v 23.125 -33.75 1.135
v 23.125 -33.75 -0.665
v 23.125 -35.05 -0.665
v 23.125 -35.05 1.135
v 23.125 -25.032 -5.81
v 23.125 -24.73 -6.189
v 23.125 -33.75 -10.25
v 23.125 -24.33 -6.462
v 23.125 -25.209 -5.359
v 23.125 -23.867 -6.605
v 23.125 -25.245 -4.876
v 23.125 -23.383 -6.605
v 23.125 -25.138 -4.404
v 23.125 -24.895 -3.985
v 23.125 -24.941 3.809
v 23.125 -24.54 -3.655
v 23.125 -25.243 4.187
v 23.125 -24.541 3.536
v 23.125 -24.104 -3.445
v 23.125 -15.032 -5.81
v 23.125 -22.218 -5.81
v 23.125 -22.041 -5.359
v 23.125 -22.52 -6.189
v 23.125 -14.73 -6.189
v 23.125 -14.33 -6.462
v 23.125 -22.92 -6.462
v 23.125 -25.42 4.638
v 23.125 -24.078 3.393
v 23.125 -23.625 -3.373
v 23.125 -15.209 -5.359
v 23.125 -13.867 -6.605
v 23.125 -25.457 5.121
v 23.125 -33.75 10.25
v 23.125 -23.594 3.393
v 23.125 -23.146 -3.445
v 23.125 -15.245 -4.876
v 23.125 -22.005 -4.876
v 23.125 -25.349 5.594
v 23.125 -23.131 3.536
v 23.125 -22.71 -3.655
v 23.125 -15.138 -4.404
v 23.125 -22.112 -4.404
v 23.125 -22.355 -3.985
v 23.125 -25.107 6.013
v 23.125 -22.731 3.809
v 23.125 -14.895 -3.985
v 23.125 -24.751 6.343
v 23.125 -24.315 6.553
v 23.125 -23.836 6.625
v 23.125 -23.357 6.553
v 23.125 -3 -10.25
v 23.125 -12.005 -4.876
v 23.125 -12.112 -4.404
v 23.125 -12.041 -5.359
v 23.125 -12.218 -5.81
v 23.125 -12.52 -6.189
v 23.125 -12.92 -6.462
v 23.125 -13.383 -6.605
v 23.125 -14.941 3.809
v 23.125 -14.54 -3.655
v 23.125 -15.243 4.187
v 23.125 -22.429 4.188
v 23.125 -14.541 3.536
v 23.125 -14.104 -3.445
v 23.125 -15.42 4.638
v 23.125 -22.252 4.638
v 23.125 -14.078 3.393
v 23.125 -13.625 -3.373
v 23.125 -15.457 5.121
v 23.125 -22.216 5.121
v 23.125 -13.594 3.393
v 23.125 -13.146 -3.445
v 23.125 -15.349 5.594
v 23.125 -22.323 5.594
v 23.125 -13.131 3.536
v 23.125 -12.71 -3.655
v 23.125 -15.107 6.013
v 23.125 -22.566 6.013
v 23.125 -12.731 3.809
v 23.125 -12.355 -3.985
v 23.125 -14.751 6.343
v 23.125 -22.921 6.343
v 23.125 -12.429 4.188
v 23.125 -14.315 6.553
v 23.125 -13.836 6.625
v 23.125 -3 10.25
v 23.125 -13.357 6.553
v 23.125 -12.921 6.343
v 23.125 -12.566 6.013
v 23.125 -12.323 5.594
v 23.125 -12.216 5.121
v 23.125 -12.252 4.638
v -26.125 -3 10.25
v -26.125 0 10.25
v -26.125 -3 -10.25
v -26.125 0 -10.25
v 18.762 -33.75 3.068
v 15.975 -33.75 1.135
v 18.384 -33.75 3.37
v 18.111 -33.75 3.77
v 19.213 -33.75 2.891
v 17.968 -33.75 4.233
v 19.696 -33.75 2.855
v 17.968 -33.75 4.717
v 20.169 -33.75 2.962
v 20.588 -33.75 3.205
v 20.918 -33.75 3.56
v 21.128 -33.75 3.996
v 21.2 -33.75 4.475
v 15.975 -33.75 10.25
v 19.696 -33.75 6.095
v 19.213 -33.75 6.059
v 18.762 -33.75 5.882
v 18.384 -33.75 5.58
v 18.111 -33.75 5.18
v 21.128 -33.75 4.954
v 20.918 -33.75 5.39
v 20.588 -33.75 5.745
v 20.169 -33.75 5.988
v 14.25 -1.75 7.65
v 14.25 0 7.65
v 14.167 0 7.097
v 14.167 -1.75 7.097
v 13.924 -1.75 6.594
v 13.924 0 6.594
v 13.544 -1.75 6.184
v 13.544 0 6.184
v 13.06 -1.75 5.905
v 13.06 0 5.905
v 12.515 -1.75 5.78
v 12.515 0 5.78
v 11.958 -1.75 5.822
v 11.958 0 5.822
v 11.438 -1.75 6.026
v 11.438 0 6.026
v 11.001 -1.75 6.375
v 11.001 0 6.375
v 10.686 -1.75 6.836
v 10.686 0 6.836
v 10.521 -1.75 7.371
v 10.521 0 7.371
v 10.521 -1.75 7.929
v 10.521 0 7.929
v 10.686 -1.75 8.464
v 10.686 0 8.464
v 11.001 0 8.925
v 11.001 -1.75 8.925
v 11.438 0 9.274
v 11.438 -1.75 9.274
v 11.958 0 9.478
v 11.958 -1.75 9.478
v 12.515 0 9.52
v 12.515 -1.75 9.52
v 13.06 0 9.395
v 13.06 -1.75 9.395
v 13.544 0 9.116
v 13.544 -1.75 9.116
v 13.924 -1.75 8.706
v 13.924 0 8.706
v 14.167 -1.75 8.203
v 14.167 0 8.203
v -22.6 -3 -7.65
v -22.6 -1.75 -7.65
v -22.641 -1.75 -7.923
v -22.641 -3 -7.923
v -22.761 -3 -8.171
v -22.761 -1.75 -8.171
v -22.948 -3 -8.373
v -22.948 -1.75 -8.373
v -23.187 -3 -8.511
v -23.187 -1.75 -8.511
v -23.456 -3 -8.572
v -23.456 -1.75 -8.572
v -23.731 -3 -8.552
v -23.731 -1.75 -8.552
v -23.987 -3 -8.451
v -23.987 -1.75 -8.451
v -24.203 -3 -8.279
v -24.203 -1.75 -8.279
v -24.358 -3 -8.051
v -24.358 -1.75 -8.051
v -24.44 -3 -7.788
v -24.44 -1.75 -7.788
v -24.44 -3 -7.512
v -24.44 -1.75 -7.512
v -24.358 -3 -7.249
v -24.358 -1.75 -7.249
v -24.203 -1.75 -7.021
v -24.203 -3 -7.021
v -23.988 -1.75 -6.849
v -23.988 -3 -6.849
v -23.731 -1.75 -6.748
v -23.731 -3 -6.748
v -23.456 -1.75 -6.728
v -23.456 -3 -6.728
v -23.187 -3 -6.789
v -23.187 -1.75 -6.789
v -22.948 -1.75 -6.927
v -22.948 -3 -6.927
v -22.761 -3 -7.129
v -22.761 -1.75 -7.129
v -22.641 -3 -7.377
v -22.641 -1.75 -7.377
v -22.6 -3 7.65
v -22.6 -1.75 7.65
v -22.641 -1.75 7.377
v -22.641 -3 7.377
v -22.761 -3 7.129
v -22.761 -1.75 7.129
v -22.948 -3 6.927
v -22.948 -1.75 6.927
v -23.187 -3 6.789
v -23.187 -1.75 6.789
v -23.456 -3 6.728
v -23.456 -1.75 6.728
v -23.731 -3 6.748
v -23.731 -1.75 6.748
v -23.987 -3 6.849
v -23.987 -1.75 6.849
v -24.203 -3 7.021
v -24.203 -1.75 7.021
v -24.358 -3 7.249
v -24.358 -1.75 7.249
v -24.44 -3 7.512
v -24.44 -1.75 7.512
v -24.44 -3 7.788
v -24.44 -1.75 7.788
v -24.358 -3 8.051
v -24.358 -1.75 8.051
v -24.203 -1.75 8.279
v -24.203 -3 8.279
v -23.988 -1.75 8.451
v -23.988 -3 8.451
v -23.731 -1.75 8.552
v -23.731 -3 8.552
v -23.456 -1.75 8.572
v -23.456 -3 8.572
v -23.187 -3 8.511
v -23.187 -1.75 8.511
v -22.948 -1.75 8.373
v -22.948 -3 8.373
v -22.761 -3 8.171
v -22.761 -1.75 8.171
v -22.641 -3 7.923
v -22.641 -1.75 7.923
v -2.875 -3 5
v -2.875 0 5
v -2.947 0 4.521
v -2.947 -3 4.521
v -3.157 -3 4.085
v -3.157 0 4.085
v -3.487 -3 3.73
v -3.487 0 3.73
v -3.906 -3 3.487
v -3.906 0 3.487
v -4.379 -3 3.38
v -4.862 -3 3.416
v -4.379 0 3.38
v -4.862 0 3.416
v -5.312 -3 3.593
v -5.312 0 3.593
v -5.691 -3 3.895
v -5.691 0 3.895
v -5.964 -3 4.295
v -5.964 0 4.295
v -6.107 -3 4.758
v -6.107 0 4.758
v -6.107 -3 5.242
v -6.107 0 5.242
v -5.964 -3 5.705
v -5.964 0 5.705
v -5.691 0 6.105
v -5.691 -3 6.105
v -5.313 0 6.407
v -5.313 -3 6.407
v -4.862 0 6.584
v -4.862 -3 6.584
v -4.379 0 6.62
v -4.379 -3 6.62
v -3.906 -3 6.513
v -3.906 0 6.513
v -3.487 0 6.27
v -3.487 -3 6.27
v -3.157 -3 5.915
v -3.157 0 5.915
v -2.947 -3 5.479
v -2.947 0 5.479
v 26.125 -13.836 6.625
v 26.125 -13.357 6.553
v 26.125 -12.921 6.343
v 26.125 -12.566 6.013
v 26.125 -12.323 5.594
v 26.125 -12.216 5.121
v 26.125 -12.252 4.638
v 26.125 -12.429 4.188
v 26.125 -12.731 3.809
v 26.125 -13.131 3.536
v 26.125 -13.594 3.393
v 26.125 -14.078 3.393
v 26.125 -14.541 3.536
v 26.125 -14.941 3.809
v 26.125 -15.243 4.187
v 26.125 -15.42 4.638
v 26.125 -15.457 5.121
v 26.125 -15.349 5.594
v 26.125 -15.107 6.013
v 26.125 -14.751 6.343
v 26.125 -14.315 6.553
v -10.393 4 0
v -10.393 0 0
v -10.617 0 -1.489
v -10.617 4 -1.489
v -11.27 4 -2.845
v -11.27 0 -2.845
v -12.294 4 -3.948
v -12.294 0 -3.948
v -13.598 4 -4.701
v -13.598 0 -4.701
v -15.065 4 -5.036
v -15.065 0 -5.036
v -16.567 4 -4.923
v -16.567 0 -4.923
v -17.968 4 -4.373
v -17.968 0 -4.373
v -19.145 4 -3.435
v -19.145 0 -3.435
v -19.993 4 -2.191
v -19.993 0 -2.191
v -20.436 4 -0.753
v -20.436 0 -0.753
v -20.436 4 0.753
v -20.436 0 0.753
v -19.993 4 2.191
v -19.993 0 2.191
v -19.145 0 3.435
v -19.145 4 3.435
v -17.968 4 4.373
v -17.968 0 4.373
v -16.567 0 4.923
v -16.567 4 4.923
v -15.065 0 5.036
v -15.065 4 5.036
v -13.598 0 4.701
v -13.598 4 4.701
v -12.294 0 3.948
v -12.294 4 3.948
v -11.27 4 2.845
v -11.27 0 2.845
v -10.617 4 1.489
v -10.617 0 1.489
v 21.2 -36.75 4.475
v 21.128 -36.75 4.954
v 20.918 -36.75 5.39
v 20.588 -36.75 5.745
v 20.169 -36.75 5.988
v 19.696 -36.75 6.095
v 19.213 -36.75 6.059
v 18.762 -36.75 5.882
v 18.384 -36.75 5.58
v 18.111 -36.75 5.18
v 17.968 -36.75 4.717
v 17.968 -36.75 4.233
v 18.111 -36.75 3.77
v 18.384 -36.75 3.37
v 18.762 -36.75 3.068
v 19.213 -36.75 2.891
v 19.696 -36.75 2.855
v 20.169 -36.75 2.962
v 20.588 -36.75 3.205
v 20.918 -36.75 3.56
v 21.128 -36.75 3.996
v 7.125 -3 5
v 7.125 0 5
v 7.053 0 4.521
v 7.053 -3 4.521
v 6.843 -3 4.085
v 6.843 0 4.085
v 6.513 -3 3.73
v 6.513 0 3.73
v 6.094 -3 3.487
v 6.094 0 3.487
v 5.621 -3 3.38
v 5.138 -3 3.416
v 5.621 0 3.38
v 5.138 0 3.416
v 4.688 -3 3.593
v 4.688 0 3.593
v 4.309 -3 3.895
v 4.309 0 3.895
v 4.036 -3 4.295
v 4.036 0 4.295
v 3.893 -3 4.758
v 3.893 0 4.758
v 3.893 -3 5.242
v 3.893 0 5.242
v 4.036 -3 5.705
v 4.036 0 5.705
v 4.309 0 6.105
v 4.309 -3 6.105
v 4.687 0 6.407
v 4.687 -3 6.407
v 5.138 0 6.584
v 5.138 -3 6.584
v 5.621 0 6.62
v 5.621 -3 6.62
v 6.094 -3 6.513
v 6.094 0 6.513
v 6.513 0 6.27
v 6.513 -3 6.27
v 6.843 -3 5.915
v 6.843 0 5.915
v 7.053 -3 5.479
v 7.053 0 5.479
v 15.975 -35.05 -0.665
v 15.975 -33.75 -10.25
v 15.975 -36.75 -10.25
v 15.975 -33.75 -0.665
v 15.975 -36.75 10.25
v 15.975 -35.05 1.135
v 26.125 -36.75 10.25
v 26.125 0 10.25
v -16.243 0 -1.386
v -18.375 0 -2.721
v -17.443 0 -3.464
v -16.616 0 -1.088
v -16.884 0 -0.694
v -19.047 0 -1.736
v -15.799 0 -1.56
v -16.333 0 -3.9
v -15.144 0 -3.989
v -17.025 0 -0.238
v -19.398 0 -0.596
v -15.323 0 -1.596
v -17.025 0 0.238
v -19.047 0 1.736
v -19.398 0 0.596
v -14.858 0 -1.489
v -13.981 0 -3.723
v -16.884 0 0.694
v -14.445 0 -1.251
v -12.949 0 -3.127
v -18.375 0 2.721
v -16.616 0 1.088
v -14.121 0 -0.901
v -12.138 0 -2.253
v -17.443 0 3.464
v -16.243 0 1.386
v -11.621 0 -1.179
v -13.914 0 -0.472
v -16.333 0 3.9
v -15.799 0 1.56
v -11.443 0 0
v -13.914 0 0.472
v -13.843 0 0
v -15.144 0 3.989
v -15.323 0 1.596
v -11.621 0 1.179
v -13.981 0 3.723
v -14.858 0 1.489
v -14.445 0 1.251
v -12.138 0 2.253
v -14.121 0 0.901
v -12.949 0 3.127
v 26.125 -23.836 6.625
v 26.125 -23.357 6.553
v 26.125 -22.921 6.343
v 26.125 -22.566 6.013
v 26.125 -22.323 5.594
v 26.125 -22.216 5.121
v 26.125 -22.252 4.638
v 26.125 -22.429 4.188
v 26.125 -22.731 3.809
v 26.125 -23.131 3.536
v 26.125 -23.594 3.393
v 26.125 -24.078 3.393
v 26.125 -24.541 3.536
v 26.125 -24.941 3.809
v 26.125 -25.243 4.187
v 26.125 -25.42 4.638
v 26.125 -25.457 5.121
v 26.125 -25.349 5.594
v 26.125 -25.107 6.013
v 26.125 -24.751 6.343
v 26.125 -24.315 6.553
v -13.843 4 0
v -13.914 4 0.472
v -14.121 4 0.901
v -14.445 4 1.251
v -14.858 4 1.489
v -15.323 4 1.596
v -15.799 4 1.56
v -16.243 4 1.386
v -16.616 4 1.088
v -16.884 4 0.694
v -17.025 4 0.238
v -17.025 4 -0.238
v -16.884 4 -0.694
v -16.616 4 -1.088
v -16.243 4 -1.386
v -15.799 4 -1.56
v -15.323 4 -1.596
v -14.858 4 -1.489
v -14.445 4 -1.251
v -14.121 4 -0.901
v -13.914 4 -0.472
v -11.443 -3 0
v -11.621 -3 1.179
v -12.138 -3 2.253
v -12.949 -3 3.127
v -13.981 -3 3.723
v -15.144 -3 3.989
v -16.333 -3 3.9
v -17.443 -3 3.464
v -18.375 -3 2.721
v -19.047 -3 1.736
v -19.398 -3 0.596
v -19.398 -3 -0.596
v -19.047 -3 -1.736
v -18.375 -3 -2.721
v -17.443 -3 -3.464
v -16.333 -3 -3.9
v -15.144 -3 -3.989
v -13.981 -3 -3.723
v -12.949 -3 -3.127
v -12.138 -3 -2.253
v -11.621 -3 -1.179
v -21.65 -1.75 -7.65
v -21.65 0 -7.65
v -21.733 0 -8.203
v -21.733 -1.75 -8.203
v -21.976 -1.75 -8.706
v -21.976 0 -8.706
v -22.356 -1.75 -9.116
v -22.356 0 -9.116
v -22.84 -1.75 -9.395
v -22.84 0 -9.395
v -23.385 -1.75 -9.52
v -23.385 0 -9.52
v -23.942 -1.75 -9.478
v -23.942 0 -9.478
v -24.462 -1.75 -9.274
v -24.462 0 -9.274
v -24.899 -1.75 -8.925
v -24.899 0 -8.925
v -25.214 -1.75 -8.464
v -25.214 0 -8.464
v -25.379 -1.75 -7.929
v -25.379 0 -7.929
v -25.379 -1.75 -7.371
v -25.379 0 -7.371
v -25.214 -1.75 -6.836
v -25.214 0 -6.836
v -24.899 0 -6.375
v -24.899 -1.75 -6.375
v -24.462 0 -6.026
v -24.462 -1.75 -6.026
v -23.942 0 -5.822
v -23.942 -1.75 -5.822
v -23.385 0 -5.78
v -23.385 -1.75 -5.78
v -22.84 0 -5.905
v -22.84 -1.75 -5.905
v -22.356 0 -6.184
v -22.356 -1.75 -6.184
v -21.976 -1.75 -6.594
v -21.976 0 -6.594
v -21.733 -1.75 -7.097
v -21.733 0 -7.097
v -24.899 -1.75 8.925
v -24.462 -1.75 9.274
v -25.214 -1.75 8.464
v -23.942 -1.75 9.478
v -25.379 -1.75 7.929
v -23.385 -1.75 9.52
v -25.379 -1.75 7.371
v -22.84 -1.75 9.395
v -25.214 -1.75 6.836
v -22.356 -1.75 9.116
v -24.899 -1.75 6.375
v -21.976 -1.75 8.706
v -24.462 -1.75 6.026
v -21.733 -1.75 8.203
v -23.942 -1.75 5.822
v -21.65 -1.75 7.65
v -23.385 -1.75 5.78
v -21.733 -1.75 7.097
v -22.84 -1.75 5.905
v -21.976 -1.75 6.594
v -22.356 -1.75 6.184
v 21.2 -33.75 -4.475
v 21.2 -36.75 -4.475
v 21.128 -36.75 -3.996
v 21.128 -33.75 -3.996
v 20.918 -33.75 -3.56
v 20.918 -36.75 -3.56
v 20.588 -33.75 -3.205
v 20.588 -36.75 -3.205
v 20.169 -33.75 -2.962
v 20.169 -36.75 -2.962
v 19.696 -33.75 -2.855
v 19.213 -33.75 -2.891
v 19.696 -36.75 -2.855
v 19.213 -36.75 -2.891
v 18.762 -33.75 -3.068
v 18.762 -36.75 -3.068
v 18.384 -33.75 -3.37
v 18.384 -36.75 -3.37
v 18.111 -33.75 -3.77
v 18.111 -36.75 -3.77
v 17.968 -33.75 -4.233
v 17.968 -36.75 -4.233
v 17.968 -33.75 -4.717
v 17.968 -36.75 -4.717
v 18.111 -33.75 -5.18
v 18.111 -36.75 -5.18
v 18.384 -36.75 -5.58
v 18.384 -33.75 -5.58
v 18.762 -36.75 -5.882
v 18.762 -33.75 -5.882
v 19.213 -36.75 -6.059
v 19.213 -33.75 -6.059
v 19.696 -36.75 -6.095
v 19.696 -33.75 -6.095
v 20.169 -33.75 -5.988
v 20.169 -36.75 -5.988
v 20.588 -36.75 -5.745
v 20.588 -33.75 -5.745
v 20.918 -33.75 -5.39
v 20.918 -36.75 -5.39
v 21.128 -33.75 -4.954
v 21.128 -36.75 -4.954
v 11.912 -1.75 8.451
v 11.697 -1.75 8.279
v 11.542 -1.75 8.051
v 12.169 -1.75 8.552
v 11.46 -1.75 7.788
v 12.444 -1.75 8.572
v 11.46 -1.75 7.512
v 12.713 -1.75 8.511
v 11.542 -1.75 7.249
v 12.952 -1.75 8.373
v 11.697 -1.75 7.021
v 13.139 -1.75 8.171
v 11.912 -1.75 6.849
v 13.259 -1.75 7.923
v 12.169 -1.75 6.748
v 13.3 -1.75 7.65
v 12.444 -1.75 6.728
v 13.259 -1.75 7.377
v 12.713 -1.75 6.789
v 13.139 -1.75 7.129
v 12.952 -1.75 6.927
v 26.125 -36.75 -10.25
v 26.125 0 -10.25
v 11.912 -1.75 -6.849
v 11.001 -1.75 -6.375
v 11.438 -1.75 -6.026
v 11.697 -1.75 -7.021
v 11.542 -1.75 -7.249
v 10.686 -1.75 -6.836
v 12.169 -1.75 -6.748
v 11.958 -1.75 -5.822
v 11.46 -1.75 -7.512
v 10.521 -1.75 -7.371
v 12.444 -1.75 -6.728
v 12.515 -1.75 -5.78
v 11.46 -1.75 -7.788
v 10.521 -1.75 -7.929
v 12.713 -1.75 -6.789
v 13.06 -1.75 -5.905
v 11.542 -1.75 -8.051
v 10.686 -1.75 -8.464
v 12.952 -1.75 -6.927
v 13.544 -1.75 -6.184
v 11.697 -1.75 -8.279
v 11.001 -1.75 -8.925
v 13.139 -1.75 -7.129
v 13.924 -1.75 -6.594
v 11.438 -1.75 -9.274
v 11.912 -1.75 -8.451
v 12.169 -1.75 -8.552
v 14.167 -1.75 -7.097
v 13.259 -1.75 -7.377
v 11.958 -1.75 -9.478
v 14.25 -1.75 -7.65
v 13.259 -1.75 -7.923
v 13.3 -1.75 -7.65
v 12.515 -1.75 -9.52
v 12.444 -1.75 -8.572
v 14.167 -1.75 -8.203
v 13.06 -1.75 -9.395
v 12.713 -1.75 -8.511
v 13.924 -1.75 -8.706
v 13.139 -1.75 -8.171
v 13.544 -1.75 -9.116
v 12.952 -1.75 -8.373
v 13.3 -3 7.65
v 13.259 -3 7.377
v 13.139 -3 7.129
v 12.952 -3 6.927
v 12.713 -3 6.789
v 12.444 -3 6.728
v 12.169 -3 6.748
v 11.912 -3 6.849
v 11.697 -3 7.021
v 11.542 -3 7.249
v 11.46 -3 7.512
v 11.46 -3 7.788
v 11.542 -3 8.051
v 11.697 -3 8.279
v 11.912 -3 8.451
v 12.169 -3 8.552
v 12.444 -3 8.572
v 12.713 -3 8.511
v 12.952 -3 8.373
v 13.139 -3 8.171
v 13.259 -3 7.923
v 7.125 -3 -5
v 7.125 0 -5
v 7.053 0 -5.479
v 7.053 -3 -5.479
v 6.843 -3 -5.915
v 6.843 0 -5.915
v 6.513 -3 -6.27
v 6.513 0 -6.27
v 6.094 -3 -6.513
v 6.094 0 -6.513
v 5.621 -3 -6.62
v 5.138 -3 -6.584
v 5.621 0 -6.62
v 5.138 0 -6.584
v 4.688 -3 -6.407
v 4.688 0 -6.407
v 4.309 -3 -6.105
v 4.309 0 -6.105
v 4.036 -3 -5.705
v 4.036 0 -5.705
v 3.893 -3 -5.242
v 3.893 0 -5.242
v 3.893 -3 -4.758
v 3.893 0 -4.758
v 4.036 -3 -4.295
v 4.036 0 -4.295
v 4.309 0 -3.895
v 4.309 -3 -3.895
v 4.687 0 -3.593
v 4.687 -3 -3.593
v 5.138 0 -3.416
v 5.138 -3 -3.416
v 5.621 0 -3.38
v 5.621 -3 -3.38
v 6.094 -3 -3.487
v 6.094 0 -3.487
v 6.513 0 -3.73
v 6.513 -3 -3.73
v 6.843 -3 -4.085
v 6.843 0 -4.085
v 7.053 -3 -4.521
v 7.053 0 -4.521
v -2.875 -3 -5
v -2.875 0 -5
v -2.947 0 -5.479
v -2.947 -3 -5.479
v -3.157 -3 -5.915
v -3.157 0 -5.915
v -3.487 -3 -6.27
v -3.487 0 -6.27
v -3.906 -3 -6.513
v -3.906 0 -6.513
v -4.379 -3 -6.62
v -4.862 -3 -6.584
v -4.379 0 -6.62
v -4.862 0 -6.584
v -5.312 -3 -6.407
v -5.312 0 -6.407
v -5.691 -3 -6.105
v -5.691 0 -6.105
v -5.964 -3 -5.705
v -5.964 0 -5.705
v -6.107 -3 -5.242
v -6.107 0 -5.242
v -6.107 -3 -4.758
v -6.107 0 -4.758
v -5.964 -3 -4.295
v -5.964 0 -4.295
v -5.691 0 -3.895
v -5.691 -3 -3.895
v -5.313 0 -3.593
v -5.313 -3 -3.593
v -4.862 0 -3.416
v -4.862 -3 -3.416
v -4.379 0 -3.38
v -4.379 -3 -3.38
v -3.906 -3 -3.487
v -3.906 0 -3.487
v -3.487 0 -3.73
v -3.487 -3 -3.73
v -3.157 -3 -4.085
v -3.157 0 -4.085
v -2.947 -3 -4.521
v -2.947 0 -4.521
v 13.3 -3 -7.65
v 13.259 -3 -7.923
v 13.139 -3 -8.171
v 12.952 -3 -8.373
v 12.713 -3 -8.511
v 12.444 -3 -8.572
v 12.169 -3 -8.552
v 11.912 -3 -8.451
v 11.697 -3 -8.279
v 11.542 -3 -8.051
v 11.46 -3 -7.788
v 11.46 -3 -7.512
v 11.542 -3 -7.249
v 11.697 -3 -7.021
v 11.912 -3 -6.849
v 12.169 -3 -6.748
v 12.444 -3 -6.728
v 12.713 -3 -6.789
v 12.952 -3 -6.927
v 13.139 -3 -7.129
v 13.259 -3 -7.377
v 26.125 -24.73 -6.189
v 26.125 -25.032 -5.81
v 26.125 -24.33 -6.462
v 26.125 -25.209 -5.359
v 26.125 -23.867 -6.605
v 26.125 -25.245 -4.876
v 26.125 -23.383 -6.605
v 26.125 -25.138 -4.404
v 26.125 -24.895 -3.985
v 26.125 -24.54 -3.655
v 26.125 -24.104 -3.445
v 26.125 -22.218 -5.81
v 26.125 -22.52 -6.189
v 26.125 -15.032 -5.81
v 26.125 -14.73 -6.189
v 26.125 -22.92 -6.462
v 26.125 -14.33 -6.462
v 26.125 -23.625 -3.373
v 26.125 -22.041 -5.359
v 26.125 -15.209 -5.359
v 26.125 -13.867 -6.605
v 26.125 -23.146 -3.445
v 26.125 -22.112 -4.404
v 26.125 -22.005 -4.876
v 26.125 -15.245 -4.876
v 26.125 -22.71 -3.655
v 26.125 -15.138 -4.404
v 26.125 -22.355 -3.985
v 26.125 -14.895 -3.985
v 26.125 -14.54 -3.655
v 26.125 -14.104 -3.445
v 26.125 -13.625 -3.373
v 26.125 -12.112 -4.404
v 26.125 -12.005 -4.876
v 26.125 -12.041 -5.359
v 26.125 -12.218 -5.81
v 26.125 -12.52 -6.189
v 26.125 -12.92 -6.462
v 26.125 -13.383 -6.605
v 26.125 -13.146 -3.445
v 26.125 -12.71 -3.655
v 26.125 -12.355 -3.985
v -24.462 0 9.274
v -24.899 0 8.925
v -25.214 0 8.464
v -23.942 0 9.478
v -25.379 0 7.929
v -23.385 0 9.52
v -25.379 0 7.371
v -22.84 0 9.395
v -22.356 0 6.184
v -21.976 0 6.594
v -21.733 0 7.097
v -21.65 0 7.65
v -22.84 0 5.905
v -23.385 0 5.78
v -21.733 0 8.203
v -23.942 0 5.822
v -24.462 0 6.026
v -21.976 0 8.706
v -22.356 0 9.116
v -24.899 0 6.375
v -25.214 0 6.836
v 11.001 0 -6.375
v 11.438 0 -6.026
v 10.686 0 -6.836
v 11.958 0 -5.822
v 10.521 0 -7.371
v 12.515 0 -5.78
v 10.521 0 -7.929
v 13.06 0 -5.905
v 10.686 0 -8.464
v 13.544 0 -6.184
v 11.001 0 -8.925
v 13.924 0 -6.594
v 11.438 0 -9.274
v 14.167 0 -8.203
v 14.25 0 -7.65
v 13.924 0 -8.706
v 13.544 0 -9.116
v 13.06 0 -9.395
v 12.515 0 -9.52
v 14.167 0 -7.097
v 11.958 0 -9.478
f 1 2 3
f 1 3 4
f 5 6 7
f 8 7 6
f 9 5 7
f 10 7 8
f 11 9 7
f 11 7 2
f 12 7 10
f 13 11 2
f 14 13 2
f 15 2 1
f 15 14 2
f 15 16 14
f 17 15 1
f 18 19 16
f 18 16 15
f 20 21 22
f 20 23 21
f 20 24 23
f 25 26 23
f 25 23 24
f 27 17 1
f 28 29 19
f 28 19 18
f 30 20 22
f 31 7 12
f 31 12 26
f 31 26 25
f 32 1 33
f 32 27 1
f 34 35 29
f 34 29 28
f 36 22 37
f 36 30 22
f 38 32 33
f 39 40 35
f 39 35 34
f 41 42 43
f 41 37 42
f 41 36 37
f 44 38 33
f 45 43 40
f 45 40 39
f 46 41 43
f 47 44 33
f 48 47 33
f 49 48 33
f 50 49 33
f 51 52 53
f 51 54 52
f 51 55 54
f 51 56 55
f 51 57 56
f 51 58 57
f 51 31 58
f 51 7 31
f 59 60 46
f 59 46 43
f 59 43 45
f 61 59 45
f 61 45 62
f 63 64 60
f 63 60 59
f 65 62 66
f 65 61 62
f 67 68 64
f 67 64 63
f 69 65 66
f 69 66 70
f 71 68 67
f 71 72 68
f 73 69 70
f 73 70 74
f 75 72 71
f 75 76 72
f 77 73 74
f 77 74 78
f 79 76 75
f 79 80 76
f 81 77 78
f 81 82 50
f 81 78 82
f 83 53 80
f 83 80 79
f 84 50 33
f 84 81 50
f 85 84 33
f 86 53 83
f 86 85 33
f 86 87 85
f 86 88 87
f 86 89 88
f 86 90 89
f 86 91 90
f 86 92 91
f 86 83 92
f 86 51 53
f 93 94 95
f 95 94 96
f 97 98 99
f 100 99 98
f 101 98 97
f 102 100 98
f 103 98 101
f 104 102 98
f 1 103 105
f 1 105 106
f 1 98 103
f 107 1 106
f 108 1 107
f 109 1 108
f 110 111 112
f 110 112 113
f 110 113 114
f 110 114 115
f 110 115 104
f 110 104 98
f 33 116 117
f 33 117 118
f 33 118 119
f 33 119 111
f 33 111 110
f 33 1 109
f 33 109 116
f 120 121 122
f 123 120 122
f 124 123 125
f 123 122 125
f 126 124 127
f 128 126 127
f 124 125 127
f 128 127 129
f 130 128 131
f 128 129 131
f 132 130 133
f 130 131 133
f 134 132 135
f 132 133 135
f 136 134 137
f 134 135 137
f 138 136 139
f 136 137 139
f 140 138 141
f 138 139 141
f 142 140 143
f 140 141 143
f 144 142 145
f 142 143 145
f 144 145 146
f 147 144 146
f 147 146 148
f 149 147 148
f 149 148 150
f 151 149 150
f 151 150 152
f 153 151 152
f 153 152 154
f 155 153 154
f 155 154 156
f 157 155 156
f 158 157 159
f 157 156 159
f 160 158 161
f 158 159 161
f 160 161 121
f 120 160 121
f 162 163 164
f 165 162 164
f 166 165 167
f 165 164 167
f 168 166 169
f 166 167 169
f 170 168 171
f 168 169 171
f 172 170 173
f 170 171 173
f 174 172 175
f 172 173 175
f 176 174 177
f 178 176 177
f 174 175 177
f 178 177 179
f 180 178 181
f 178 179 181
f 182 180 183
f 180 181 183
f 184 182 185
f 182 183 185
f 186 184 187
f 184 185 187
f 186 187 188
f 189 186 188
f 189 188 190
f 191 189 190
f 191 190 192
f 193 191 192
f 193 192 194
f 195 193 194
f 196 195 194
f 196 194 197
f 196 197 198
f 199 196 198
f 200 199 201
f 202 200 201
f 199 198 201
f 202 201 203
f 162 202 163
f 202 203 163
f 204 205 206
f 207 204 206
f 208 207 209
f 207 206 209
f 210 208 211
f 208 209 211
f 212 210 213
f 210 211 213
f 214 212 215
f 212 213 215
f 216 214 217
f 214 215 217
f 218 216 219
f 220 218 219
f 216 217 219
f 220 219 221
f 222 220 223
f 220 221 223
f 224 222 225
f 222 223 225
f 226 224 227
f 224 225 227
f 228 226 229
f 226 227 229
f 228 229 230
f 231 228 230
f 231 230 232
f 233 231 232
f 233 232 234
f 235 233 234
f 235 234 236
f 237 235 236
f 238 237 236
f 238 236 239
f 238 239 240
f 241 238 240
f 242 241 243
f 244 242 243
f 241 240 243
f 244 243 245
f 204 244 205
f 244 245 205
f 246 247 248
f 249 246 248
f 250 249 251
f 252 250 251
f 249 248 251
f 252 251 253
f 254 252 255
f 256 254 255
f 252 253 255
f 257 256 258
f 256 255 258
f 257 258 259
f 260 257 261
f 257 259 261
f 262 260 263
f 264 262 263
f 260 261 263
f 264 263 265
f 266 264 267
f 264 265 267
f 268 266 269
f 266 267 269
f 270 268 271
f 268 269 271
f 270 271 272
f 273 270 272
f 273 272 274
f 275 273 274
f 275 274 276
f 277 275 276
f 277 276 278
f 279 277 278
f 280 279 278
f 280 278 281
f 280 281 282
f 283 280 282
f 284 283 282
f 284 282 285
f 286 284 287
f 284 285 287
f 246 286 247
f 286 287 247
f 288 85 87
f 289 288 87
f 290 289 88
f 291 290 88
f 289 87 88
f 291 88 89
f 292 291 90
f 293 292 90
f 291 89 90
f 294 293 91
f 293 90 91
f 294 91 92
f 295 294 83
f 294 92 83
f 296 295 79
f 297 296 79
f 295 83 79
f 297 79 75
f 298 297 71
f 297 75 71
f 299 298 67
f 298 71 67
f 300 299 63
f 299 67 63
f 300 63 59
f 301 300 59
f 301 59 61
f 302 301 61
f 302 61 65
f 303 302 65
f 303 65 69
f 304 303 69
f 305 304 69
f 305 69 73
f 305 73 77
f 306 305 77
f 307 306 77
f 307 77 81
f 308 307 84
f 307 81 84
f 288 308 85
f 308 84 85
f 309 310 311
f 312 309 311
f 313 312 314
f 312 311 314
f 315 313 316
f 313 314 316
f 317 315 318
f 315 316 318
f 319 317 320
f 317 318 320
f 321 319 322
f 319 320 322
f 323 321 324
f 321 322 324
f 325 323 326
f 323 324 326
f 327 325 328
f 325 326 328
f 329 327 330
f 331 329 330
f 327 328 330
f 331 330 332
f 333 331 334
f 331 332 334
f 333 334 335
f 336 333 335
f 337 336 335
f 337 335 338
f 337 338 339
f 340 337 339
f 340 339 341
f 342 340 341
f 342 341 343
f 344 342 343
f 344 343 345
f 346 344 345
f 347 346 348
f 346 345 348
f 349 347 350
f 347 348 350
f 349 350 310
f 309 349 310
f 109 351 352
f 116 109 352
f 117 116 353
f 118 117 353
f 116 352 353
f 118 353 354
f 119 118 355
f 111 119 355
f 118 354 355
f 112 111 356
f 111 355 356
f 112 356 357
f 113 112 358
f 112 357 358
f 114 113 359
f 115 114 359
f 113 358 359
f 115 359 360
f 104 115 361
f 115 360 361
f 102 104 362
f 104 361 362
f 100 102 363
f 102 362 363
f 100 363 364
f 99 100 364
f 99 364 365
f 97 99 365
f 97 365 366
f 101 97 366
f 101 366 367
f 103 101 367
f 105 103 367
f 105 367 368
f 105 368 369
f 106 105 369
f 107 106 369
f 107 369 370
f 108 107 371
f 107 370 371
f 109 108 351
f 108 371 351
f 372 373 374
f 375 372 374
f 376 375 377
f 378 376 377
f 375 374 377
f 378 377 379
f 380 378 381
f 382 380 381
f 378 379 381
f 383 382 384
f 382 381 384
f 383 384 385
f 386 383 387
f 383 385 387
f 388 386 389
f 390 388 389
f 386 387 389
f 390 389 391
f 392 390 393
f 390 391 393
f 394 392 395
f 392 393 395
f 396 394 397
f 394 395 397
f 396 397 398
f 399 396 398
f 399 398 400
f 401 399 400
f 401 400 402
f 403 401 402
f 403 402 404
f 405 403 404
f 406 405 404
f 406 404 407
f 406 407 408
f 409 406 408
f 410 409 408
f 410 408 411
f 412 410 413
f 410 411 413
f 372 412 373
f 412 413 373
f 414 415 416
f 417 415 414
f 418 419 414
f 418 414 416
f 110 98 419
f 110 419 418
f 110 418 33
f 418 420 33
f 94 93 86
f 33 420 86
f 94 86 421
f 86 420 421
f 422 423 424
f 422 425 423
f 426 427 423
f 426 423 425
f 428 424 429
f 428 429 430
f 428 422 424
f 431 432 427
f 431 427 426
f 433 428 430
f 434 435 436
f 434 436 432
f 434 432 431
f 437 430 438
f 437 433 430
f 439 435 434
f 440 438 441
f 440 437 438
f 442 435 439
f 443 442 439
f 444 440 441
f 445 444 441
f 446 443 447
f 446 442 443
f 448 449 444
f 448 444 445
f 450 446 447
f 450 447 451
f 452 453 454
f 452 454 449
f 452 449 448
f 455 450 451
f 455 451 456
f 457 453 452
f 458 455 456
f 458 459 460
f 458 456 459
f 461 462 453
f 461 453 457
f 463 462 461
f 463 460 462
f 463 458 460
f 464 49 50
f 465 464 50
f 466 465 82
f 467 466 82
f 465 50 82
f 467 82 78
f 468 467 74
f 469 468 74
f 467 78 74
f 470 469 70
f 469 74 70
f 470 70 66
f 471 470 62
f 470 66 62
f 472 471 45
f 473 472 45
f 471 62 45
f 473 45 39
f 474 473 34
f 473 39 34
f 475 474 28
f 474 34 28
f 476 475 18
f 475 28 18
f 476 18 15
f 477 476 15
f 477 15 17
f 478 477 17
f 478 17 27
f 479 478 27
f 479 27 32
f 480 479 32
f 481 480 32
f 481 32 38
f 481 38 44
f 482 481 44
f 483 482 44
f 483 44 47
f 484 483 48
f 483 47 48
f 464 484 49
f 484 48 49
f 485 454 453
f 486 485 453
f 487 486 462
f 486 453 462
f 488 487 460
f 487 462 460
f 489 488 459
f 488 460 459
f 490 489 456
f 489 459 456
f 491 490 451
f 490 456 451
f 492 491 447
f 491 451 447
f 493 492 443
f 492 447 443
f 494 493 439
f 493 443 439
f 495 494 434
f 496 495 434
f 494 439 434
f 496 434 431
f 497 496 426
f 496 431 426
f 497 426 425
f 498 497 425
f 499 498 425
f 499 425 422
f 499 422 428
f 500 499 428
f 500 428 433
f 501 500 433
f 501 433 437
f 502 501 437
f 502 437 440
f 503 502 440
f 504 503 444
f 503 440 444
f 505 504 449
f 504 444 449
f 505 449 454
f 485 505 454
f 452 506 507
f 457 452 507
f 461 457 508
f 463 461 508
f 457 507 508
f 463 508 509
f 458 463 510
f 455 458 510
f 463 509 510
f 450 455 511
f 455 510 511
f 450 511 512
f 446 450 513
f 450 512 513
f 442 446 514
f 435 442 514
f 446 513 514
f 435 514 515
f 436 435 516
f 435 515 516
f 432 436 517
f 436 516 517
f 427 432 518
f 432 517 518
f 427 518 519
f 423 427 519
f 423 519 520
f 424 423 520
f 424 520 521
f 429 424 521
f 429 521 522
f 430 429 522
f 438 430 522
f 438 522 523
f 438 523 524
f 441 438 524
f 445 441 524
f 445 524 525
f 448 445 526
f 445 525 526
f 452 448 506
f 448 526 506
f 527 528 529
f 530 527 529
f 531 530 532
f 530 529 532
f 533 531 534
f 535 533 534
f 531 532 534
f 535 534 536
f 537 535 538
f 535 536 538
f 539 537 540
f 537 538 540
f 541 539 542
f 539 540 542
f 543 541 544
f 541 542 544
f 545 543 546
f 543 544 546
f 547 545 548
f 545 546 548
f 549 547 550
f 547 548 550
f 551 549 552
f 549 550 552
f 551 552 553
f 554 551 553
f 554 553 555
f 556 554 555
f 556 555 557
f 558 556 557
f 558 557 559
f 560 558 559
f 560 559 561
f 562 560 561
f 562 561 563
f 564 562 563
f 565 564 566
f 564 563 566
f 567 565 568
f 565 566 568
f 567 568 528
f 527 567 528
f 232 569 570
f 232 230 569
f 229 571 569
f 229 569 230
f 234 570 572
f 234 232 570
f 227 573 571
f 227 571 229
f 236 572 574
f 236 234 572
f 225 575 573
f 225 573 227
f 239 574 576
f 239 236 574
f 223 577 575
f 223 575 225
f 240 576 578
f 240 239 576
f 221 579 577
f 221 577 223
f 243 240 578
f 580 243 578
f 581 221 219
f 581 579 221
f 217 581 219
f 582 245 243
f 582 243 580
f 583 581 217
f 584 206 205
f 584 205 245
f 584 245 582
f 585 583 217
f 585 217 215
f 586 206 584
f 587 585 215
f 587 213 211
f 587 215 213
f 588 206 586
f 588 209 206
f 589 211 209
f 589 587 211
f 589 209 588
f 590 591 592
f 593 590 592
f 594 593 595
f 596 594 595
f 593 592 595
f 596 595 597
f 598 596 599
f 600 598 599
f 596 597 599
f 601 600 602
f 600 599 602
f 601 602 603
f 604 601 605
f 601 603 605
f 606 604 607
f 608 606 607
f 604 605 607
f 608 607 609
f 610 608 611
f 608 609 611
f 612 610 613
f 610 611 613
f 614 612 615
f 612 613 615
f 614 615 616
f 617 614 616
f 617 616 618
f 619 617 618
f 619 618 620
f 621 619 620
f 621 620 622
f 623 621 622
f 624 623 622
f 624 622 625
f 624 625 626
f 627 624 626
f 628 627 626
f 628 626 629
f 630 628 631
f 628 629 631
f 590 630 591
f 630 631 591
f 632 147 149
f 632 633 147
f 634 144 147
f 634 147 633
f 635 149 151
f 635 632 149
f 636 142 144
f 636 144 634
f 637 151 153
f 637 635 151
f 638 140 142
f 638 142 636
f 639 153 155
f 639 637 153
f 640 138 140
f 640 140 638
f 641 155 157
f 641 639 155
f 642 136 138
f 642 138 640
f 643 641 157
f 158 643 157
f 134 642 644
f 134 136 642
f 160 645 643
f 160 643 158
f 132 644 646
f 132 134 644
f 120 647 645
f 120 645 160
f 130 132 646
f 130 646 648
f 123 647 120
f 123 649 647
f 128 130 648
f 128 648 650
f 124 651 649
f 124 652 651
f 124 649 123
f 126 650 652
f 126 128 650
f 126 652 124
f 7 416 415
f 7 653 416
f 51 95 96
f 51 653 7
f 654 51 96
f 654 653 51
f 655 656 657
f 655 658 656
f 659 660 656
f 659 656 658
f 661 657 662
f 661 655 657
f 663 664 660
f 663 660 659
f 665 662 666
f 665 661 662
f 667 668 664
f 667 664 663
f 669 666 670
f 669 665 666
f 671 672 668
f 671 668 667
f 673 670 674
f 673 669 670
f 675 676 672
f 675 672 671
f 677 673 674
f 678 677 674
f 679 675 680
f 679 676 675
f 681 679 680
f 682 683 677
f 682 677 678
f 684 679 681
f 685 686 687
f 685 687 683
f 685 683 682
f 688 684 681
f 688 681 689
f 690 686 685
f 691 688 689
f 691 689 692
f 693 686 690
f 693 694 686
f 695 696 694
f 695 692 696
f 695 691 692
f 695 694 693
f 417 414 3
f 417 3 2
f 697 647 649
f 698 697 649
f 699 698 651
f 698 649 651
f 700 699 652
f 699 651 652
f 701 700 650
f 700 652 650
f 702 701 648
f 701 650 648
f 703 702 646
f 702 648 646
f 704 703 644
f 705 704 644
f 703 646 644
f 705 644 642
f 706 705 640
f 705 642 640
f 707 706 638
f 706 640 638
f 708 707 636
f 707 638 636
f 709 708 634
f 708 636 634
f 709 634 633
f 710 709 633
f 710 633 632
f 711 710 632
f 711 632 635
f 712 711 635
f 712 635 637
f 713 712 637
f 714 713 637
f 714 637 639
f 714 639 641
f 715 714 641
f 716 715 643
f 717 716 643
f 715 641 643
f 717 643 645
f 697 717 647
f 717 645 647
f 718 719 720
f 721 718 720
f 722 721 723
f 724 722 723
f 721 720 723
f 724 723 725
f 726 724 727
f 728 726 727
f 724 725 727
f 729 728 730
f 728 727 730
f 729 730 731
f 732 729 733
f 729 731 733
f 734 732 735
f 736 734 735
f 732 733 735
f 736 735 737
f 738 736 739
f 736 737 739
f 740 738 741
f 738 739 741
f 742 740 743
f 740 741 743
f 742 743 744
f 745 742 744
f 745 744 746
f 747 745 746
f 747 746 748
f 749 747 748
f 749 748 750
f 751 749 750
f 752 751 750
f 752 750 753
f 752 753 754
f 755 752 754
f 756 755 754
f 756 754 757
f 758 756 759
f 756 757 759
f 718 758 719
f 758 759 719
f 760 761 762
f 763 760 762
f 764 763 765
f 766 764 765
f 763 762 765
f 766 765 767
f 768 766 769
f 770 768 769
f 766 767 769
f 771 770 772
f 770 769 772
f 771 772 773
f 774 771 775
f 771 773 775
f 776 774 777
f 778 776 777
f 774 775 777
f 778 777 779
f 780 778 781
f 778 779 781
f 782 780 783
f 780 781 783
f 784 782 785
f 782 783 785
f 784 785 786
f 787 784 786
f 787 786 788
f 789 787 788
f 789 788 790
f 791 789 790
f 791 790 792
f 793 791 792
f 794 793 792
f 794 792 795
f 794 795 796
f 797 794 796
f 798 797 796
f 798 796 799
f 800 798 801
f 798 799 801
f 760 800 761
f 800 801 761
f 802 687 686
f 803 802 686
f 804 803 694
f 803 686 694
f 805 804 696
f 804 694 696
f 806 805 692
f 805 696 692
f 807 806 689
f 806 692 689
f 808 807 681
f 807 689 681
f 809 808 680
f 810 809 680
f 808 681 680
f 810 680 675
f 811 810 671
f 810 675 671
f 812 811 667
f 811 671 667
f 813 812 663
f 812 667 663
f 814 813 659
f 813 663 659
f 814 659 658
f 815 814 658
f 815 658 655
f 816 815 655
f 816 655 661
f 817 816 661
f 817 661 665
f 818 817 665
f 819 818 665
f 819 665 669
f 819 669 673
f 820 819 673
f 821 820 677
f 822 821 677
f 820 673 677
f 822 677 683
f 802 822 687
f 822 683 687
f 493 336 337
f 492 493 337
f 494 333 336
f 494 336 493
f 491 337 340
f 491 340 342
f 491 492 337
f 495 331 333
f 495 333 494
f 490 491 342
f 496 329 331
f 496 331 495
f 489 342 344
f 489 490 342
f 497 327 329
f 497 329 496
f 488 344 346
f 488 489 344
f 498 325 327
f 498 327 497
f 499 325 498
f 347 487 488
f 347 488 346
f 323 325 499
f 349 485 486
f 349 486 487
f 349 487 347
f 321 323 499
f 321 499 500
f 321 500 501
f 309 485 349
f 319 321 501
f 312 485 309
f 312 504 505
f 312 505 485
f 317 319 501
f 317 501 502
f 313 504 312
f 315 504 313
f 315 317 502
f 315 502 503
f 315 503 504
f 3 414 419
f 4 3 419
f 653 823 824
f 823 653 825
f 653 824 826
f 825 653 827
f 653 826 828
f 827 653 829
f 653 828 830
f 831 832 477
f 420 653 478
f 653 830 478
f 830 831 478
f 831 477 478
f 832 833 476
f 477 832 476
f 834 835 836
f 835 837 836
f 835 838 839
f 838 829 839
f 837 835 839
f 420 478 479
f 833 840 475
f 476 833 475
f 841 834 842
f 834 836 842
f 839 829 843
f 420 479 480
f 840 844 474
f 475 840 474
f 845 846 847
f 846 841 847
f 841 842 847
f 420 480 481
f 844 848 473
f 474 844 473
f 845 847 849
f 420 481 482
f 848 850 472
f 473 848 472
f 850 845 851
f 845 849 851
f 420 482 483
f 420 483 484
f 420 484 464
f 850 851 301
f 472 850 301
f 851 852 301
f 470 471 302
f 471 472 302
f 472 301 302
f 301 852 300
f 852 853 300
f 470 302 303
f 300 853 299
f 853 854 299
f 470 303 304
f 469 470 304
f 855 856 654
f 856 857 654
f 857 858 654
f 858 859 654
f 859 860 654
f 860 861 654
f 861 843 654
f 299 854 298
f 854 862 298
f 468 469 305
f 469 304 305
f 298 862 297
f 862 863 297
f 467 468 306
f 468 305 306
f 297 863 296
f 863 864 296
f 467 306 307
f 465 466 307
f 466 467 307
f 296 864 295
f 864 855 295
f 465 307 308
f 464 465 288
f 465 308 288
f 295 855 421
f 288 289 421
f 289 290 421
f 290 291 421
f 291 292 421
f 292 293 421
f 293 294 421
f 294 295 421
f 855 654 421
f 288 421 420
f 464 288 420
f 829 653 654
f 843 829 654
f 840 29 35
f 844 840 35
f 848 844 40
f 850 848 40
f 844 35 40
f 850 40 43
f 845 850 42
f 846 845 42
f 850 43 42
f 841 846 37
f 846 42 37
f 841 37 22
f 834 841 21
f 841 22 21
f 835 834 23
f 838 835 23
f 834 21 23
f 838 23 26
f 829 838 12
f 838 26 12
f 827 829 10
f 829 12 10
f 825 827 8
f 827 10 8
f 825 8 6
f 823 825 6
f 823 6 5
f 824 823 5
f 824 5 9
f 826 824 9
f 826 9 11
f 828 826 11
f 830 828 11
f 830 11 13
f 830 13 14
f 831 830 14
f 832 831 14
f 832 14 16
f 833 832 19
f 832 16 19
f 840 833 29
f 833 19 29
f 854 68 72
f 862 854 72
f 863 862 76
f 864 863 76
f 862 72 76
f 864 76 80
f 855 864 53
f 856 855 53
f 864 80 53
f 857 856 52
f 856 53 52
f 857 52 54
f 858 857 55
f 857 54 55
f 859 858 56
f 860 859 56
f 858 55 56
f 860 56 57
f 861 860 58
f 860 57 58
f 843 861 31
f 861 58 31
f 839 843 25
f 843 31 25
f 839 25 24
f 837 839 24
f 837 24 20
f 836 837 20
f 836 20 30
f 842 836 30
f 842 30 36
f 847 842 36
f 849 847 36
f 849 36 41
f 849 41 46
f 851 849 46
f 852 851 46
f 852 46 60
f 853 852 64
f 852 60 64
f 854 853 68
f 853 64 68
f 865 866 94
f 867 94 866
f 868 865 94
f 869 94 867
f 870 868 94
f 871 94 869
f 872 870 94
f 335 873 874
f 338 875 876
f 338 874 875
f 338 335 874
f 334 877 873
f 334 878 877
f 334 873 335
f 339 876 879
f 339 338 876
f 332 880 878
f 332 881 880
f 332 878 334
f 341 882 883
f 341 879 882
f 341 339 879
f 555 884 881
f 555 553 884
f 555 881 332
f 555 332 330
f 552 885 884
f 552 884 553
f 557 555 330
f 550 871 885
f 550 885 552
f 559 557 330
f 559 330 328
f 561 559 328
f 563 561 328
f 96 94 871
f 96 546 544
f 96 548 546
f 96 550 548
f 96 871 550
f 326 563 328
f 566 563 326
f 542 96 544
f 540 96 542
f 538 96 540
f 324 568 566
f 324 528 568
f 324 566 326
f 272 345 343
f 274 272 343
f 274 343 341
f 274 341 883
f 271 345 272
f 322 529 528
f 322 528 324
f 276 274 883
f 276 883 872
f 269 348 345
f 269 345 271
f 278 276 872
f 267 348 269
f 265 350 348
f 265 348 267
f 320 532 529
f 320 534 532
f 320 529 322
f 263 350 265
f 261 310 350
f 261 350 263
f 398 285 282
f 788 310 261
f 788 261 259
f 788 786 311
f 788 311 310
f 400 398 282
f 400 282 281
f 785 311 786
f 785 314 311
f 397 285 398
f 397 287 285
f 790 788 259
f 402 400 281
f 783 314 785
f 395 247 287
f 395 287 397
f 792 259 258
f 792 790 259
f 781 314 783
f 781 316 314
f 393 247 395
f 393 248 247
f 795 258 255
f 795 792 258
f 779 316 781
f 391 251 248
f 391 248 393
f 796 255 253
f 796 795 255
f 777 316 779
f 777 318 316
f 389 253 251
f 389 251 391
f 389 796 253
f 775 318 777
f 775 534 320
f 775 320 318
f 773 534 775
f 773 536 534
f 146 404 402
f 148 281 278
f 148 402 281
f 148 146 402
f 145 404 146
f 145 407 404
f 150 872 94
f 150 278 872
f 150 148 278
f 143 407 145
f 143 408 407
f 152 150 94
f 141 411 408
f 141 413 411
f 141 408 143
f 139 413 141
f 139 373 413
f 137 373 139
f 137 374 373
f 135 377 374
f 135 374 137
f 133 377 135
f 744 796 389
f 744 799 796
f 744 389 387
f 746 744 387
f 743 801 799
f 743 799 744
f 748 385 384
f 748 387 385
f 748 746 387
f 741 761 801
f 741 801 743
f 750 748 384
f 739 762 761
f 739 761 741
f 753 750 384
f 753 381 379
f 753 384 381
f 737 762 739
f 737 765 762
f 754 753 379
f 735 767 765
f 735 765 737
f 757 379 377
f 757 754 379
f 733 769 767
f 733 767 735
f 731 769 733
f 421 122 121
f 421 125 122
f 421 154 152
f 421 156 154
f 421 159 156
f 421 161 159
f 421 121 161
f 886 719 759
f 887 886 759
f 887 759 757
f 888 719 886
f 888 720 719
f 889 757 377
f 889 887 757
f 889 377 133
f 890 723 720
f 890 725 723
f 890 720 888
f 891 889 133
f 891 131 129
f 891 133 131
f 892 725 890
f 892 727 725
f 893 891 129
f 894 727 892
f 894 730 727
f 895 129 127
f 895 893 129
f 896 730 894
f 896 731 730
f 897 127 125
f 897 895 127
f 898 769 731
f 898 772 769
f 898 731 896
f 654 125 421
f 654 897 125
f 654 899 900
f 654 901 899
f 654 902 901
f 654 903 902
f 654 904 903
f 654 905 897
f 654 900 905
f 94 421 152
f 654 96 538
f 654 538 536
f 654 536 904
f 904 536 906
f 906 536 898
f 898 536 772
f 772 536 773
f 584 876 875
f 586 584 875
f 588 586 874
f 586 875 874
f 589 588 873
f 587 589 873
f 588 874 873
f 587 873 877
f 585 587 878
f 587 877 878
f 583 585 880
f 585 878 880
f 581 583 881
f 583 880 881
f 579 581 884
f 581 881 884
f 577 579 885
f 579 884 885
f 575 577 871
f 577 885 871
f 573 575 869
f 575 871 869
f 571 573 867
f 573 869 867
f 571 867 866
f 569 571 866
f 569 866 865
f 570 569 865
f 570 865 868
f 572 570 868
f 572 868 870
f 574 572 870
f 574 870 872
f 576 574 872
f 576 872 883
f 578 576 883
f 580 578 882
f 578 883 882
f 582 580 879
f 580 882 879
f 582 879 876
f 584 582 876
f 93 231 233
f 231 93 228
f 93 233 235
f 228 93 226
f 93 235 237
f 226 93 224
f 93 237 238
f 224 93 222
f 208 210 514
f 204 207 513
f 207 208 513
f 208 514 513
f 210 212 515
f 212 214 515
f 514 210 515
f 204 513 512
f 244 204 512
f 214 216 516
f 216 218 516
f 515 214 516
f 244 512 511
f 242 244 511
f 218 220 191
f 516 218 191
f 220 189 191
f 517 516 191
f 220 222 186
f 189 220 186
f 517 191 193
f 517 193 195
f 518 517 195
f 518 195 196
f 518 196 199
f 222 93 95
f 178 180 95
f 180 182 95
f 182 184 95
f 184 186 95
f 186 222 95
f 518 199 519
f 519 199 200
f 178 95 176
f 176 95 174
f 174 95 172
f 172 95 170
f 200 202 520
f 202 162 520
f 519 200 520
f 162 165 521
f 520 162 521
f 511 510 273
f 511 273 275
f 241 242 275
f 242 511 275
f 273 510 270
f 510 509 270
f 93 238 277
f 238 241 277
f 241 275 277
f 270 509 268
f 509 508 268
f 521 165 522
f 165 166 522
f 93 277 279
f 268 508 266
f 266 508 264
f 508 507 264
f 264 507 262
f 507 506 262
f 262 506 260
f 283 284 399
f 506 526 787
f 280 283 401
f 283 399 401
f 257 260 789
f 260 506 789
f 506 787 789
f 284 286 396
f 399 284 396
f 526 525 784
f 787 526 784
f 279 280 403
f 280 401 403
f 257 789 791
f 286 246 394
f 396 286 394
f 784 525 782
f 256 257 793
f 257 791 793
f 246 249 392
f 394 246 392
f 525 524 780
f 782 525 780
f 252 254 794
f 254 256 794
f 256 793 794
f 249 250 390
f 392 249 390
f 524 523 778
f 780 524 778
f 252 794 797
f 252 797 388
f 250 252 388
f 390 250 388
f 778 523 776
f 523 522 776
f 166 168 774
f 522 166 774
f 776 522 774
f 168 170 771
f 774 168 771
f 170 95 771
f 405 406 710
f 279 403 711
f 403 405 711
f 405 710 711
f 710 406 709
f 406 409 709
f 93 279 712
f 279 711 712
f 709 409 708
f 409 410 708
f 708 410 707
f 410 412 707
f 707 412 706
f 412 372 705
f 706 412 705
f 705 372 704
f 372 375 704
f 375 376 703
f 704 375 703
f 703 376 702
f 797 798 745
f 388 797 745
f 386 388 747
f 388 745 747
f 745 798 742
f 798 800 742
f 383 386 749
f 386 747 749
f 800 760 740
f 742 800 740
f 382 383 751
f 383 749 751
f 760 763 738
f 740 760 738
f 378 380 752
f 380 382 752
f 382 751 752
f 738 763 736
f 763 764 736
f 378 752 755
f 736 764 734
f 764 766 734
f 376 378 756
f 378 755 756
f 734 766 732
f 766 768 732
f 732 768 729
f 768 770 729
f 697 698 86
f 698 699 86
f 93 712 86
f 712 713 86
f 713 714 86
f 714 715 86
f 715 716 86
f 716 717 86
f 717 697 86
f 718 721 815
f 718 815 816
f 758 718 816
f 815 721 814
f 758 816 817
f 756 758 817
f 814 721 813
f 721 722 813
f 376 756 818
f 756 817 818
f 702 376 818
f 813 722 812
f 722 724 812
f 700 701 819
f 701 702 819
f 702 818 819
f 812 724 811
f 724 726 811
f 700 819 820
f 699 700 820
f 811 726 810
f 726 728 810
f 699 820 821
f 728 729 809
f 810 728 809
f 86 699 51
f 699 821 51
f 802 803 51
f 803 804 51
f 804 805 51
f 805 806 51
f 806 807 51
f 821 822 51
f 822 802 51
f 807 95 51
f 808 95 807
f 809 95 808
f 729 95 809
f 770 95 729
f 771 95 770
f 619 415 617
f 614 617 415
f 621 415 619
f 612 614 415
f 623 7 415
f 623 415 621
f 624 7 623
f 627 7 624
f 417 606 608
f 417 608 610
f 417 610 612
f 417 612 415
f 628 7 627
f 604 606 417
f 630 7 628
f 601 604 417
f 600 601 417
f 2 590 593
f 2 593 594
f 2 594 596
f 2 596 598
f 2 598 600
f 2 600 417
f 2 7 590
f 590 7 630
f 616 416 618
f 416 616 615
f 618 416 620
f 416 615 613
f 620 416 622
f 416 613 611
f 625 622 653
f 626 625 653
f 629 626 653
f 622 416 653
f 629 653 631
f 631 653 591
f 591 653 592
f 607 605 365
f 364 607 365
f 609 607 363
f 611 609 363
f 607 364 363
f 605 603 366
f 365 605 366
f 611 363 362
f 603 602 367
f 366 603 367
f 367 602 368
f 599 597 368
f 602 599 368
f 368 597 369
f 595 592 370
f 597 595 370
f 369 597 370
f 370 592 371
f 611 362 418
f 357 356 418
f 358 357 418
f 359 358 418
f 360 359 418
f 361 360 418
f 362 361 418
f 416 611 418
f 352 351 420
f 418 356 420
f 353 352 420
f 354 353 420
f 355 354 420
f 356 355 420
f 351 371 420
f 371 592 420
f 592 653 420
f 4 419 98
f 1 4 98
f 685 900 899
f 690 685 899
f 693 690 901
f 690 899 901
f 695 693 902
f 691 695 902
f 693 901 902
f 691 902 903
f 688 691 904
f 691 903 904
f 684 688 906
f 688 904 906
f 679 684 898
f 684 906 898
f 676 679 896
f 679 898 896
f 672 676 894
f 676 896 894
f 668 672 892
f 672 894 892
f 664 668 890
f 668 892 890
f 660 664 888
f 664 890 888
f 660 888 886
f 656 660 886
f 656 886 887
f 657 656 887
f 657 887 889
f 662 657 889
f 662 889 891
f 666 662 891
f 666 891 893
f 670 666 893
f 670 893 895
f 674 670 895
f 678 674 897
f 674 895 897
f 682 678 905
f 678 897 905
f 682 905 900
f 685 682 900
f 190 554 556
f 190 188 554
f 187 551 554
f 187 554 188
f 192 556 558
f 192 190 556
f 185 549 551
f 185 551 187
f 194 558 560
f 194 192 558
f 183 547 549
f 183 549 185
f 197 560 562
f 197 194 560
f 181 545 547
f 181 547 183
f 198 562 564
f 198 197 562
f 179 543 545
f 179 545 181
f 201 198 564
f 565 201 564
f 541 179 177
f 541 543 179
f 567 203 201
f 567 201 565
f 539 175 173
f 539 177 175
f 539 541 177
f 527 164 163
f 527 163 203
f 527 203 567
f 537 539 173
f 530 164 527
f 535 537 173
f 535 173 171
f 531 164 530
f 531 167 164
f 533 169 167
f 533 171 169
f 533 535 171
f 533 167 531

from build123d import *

# Parameters (mm, degrees)
SKETCH1_W           = 52.25
SKETCH1_H           = 20.5
BOSS_EXTRUDE1_DEPTH = 3
SKETCH2_W           = 3
SKETCH2_H           = 20.5
BOSS_EXTRUDE2_DEPTH = 33.75
SKETCH3_W           = 20.5
SKETCH3_H           = 3
BOSS_EXTRUDE3_DEPTH = 7.15
SKETCH4_R           = 1.625
CUT_EXTRUDE1_DEPTH  = 3
SKETCH5_W           = 1.8
SKETCH5_H           = 1.3
CUT_EXTRUDE2_DEPTH  = 7.15
SKETCH6_R           = 1.625
CUT_EXTRUDE3_DEPTH  = 3
SKETCH7_R           = 1.625
CUT_EXTRUDE4_DEPTH  = 3
SKETCH8_R           = 1.875
CUT_EXTRUDE5_DEPTH  = 1.75
SKETCH9_R           = 0.925
CUT_EXTRUDE6_DEPTH  = 1.25
SKETCH12_R          = 5.05
BOSS_EXTRUDE4_DEPTH = 4
SKETCH11_R          = 4
CUT_EXTRUDE7_DEPTH  = 3
SKETCH13_R          = 1.6
CUT_EXTRUDE8_DEPTH  = 4


with BuildPart() as part:
    # Sketch1 → Boss-Extrude1 (new body)
    with BuildSketch(Plane(origin=(0, 0, 0), x_dir=(1, 0, 0), z_dir=(0, 1, 0))):
        Rectangle(SKETCH1_W, SKETCH1_H)
    extrude(amount=-BOSS_EXTRUDE1_DEPTH)

    # Sketch2 → Boss-Extrude2 (add)
    with BuildSketch(Plane.XZ.offset(3)):
        with Locations((24.625, 0)):
            Rectangle(SKETCH2_W, SKETCH2_H)
    extrude(amount=BOSS_EXTRUDE2_DEPTH)

    # Sketch3 → Boss-Extrude3 (add)
    with BuildSketch(Plane.ZY.offset(-23.125)):
        with Locations((0, -35.25)):
            Rectangle(SKETCH3_W, SKETCH3_H)
    extrude(amount=BOSS_EXTRUDE3_DEPTH)

    # Sketch4 → Cut-Extrude1 (cut)
    with BuildSketch(Plane.XZ.offset(36.75)):
        with Locations((19.575, 4.475)):
            Circle(SKETCH4_R)
        with Locations((19.575, -4.475)):
            Circle(SKETCH4_R)
    extrude(amount=-CUT_EXTRUDE1_DEPTH, mode=Mode.SUBTRACT)

    # Sketch5 → Cut-Extrude2 (cut)
    with BuildSketch(Plane.ZY.offset(-15.975)):
        with Locations((0.235327499, -34.4)):
            Rectangle(SKETCH5_W, SKETCH5_H)
    extrude(amount=-CUT_EXTRUDE2_DEPTH, mode=Mode.SUBTRACT)

    # Sketch6 → Cut-Extrude3 (cut)
    with BuildSketch(Plane.ZY.offset(-23.125)):
        with Locations((-4.997772224, -13.625)):
            Circle(SKETCH6_R)
        with Locations((-4.997772224, -23.625)):
            Circle(SKETCH6_R)
        with Locations((5, -23.836070013)):
            Circle(SKETCH6_R)
        with Locations((5, -13.836070013)):
            Circle(SKETCH6_R)
    extrude(amount=-CUT_EXTRUDE3_DEPTH, mode=Mode.SUBTRACT)

    # Sketch7 → Cut-Extrude4 (cut)
    with BuildSketch(Plane(origin=(0, 0, 0), x_dir=(1, 0, 0), z_dir=(0, 1, 0))):
        with Locations((-4.5, 5)):
            Circle(SKETCH7_R)
        with Locations((-4.5, -5)):
            Circle(SKETCH7_R)
        with Locations((5.5, 5)):
            Circle(SKETCH7_R)
        with Locations((5.5, -5)):
            Circle(SKETCH7_R)
    extrude(amount=-CUT_EXTRUDE4_DEPTH, mode=Mode.SUBTRACT)

    # Sketch8 → Cut-Extrude5 (cut)
    with BuildSketch(Plane(origin=(0, 0, 0), x_dir=(1, 0, 0), z_dir=(0, 1, 0))):
        with Locations((-23.525, 7.65)):
            Circle(SKETCH8_R)
        with Locations((-23.525, -7.65)):
            Circle(SKETCH8_R)
        with Locations((12.375, 7.65)):
            Circle(SKETCH8_R)
        with Locations((12.375, -7.65)):
            Circle(SKETCH8_R)
    extrude(amount=-CUT_EXTRUDE5_DEPTH, mode=Mode.SUBTRACT)

    # Sketch9 → Cut-Extrude6 (cut)
    with BuildSketch(Plane(origin=(0, -1.75, 0), x_dir=(1, 0, 0), z_dir=(0, 1, 0))):
        with Locations((-23.525, 7.65)):
            Circle(SKETCH9_R)
        with Locations((-23.525, -7.65)):
            Circle(SKETCH9_R)
        with Locations((12.375, -7.65)):
            Circle(SKETCH9_R)
        with Locations((12.375, 7.65)):
            Circle(SKETCH9_R)
    extrude(amount=-CUT_EXTRUDE6_DEPTH, mode=Mode.SUBTRACT)

    # Sketch12 → Boss-Extrude4 (add)
    with BuildSketch(Plane(origin=(0, 0, 0), x_dir=(1, 0, 0), z_dir=(0, 1, 0))):
        with Locations((-15.442849896, 0)):
            Circle(SKETCH12_R)
    extrude(amount=BOSS_EXTRUDE4_DEPTH)

    # Sketch11 → Cut-Extrude7 (cut)
    with BuildSketch(Plane.XZ.offset(3)):
        with Locations((-15.442849896, 0)):
            Circle(SKETCH11_R)
    extrude(amount=-CUT_EXTRUDE7_DEPTH, mode=Mode.SUBTRACT)

    # Sketch13 → Cut-Extrude8 (cut)
    with BuildSketch(Plane.XZ):
        with Locations((-15.442849896, 0)):
            Circle(SKETCH13_R)
    extrude(amount=-CUT_EXTRUDE8_DEPTH, mode=Mode.SUBTRACT)


solid = part.part
